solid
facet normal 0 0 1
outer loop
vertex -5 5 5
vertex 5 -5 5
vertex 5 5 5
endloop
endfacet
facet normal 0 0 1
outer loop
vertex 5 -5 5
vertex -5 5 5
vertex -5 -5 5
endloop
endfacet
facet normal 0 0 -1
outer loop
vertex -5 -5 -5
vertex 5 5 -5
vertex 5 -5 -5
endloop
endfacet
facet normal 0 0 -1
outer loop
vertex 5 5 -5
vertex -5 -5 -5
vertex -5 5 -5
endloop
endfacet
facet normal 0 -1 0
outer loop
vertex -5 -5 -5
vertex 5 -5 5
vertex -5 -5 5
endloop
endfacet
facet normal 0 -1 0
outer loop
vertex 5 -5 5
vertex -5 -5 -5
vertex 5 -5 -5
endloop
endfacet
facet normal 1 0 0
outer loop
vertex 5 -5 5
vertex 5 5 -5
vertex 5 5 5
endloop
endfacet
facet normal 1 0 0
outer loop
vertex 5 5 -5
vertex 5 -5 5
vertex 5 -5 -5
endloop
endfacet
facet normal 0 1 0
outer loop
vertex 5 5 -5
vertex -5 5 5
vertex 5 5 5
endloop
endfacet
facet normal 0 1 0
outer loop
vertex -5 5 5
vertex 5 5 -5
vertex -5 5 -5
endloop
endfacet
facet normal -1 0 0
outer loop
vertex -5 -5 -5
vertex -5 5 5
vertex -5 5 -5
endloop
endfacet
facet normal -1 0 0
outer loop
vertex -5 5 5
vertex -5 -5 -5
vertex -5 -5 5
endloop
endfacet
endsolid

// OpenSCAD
// The OpenSCAD half of a dual-engine fixture. Its whole job is to model EXACTLY the
// same solid as block.py so the parity pass has a pair that genuinely agrees — a
// centred cube, no curves, so the two kernels produce the same AABB and the same
// volume with no chord error to explain away.
//
// Both `render_mode` (what the platform sends for a part whose manifest declares one)
// and `target_part` (what a cartridge dispatching by name reads) are honoured, as in
// the scad-block fixture, because the renderer passes both.

block_size = 10;
plate_h = 2;
render_mode = 0;
target_part = "block";

module plain_block() {
    cube([block_size, block_size, block_size], center = true);
}

module plate() {
    cube([block_size * 2, block_size * 2, plate_h], center = true);
}

if (render_mode == 2 || target_part == "plate") {
    plate();
} else {
    plain_block();
}
